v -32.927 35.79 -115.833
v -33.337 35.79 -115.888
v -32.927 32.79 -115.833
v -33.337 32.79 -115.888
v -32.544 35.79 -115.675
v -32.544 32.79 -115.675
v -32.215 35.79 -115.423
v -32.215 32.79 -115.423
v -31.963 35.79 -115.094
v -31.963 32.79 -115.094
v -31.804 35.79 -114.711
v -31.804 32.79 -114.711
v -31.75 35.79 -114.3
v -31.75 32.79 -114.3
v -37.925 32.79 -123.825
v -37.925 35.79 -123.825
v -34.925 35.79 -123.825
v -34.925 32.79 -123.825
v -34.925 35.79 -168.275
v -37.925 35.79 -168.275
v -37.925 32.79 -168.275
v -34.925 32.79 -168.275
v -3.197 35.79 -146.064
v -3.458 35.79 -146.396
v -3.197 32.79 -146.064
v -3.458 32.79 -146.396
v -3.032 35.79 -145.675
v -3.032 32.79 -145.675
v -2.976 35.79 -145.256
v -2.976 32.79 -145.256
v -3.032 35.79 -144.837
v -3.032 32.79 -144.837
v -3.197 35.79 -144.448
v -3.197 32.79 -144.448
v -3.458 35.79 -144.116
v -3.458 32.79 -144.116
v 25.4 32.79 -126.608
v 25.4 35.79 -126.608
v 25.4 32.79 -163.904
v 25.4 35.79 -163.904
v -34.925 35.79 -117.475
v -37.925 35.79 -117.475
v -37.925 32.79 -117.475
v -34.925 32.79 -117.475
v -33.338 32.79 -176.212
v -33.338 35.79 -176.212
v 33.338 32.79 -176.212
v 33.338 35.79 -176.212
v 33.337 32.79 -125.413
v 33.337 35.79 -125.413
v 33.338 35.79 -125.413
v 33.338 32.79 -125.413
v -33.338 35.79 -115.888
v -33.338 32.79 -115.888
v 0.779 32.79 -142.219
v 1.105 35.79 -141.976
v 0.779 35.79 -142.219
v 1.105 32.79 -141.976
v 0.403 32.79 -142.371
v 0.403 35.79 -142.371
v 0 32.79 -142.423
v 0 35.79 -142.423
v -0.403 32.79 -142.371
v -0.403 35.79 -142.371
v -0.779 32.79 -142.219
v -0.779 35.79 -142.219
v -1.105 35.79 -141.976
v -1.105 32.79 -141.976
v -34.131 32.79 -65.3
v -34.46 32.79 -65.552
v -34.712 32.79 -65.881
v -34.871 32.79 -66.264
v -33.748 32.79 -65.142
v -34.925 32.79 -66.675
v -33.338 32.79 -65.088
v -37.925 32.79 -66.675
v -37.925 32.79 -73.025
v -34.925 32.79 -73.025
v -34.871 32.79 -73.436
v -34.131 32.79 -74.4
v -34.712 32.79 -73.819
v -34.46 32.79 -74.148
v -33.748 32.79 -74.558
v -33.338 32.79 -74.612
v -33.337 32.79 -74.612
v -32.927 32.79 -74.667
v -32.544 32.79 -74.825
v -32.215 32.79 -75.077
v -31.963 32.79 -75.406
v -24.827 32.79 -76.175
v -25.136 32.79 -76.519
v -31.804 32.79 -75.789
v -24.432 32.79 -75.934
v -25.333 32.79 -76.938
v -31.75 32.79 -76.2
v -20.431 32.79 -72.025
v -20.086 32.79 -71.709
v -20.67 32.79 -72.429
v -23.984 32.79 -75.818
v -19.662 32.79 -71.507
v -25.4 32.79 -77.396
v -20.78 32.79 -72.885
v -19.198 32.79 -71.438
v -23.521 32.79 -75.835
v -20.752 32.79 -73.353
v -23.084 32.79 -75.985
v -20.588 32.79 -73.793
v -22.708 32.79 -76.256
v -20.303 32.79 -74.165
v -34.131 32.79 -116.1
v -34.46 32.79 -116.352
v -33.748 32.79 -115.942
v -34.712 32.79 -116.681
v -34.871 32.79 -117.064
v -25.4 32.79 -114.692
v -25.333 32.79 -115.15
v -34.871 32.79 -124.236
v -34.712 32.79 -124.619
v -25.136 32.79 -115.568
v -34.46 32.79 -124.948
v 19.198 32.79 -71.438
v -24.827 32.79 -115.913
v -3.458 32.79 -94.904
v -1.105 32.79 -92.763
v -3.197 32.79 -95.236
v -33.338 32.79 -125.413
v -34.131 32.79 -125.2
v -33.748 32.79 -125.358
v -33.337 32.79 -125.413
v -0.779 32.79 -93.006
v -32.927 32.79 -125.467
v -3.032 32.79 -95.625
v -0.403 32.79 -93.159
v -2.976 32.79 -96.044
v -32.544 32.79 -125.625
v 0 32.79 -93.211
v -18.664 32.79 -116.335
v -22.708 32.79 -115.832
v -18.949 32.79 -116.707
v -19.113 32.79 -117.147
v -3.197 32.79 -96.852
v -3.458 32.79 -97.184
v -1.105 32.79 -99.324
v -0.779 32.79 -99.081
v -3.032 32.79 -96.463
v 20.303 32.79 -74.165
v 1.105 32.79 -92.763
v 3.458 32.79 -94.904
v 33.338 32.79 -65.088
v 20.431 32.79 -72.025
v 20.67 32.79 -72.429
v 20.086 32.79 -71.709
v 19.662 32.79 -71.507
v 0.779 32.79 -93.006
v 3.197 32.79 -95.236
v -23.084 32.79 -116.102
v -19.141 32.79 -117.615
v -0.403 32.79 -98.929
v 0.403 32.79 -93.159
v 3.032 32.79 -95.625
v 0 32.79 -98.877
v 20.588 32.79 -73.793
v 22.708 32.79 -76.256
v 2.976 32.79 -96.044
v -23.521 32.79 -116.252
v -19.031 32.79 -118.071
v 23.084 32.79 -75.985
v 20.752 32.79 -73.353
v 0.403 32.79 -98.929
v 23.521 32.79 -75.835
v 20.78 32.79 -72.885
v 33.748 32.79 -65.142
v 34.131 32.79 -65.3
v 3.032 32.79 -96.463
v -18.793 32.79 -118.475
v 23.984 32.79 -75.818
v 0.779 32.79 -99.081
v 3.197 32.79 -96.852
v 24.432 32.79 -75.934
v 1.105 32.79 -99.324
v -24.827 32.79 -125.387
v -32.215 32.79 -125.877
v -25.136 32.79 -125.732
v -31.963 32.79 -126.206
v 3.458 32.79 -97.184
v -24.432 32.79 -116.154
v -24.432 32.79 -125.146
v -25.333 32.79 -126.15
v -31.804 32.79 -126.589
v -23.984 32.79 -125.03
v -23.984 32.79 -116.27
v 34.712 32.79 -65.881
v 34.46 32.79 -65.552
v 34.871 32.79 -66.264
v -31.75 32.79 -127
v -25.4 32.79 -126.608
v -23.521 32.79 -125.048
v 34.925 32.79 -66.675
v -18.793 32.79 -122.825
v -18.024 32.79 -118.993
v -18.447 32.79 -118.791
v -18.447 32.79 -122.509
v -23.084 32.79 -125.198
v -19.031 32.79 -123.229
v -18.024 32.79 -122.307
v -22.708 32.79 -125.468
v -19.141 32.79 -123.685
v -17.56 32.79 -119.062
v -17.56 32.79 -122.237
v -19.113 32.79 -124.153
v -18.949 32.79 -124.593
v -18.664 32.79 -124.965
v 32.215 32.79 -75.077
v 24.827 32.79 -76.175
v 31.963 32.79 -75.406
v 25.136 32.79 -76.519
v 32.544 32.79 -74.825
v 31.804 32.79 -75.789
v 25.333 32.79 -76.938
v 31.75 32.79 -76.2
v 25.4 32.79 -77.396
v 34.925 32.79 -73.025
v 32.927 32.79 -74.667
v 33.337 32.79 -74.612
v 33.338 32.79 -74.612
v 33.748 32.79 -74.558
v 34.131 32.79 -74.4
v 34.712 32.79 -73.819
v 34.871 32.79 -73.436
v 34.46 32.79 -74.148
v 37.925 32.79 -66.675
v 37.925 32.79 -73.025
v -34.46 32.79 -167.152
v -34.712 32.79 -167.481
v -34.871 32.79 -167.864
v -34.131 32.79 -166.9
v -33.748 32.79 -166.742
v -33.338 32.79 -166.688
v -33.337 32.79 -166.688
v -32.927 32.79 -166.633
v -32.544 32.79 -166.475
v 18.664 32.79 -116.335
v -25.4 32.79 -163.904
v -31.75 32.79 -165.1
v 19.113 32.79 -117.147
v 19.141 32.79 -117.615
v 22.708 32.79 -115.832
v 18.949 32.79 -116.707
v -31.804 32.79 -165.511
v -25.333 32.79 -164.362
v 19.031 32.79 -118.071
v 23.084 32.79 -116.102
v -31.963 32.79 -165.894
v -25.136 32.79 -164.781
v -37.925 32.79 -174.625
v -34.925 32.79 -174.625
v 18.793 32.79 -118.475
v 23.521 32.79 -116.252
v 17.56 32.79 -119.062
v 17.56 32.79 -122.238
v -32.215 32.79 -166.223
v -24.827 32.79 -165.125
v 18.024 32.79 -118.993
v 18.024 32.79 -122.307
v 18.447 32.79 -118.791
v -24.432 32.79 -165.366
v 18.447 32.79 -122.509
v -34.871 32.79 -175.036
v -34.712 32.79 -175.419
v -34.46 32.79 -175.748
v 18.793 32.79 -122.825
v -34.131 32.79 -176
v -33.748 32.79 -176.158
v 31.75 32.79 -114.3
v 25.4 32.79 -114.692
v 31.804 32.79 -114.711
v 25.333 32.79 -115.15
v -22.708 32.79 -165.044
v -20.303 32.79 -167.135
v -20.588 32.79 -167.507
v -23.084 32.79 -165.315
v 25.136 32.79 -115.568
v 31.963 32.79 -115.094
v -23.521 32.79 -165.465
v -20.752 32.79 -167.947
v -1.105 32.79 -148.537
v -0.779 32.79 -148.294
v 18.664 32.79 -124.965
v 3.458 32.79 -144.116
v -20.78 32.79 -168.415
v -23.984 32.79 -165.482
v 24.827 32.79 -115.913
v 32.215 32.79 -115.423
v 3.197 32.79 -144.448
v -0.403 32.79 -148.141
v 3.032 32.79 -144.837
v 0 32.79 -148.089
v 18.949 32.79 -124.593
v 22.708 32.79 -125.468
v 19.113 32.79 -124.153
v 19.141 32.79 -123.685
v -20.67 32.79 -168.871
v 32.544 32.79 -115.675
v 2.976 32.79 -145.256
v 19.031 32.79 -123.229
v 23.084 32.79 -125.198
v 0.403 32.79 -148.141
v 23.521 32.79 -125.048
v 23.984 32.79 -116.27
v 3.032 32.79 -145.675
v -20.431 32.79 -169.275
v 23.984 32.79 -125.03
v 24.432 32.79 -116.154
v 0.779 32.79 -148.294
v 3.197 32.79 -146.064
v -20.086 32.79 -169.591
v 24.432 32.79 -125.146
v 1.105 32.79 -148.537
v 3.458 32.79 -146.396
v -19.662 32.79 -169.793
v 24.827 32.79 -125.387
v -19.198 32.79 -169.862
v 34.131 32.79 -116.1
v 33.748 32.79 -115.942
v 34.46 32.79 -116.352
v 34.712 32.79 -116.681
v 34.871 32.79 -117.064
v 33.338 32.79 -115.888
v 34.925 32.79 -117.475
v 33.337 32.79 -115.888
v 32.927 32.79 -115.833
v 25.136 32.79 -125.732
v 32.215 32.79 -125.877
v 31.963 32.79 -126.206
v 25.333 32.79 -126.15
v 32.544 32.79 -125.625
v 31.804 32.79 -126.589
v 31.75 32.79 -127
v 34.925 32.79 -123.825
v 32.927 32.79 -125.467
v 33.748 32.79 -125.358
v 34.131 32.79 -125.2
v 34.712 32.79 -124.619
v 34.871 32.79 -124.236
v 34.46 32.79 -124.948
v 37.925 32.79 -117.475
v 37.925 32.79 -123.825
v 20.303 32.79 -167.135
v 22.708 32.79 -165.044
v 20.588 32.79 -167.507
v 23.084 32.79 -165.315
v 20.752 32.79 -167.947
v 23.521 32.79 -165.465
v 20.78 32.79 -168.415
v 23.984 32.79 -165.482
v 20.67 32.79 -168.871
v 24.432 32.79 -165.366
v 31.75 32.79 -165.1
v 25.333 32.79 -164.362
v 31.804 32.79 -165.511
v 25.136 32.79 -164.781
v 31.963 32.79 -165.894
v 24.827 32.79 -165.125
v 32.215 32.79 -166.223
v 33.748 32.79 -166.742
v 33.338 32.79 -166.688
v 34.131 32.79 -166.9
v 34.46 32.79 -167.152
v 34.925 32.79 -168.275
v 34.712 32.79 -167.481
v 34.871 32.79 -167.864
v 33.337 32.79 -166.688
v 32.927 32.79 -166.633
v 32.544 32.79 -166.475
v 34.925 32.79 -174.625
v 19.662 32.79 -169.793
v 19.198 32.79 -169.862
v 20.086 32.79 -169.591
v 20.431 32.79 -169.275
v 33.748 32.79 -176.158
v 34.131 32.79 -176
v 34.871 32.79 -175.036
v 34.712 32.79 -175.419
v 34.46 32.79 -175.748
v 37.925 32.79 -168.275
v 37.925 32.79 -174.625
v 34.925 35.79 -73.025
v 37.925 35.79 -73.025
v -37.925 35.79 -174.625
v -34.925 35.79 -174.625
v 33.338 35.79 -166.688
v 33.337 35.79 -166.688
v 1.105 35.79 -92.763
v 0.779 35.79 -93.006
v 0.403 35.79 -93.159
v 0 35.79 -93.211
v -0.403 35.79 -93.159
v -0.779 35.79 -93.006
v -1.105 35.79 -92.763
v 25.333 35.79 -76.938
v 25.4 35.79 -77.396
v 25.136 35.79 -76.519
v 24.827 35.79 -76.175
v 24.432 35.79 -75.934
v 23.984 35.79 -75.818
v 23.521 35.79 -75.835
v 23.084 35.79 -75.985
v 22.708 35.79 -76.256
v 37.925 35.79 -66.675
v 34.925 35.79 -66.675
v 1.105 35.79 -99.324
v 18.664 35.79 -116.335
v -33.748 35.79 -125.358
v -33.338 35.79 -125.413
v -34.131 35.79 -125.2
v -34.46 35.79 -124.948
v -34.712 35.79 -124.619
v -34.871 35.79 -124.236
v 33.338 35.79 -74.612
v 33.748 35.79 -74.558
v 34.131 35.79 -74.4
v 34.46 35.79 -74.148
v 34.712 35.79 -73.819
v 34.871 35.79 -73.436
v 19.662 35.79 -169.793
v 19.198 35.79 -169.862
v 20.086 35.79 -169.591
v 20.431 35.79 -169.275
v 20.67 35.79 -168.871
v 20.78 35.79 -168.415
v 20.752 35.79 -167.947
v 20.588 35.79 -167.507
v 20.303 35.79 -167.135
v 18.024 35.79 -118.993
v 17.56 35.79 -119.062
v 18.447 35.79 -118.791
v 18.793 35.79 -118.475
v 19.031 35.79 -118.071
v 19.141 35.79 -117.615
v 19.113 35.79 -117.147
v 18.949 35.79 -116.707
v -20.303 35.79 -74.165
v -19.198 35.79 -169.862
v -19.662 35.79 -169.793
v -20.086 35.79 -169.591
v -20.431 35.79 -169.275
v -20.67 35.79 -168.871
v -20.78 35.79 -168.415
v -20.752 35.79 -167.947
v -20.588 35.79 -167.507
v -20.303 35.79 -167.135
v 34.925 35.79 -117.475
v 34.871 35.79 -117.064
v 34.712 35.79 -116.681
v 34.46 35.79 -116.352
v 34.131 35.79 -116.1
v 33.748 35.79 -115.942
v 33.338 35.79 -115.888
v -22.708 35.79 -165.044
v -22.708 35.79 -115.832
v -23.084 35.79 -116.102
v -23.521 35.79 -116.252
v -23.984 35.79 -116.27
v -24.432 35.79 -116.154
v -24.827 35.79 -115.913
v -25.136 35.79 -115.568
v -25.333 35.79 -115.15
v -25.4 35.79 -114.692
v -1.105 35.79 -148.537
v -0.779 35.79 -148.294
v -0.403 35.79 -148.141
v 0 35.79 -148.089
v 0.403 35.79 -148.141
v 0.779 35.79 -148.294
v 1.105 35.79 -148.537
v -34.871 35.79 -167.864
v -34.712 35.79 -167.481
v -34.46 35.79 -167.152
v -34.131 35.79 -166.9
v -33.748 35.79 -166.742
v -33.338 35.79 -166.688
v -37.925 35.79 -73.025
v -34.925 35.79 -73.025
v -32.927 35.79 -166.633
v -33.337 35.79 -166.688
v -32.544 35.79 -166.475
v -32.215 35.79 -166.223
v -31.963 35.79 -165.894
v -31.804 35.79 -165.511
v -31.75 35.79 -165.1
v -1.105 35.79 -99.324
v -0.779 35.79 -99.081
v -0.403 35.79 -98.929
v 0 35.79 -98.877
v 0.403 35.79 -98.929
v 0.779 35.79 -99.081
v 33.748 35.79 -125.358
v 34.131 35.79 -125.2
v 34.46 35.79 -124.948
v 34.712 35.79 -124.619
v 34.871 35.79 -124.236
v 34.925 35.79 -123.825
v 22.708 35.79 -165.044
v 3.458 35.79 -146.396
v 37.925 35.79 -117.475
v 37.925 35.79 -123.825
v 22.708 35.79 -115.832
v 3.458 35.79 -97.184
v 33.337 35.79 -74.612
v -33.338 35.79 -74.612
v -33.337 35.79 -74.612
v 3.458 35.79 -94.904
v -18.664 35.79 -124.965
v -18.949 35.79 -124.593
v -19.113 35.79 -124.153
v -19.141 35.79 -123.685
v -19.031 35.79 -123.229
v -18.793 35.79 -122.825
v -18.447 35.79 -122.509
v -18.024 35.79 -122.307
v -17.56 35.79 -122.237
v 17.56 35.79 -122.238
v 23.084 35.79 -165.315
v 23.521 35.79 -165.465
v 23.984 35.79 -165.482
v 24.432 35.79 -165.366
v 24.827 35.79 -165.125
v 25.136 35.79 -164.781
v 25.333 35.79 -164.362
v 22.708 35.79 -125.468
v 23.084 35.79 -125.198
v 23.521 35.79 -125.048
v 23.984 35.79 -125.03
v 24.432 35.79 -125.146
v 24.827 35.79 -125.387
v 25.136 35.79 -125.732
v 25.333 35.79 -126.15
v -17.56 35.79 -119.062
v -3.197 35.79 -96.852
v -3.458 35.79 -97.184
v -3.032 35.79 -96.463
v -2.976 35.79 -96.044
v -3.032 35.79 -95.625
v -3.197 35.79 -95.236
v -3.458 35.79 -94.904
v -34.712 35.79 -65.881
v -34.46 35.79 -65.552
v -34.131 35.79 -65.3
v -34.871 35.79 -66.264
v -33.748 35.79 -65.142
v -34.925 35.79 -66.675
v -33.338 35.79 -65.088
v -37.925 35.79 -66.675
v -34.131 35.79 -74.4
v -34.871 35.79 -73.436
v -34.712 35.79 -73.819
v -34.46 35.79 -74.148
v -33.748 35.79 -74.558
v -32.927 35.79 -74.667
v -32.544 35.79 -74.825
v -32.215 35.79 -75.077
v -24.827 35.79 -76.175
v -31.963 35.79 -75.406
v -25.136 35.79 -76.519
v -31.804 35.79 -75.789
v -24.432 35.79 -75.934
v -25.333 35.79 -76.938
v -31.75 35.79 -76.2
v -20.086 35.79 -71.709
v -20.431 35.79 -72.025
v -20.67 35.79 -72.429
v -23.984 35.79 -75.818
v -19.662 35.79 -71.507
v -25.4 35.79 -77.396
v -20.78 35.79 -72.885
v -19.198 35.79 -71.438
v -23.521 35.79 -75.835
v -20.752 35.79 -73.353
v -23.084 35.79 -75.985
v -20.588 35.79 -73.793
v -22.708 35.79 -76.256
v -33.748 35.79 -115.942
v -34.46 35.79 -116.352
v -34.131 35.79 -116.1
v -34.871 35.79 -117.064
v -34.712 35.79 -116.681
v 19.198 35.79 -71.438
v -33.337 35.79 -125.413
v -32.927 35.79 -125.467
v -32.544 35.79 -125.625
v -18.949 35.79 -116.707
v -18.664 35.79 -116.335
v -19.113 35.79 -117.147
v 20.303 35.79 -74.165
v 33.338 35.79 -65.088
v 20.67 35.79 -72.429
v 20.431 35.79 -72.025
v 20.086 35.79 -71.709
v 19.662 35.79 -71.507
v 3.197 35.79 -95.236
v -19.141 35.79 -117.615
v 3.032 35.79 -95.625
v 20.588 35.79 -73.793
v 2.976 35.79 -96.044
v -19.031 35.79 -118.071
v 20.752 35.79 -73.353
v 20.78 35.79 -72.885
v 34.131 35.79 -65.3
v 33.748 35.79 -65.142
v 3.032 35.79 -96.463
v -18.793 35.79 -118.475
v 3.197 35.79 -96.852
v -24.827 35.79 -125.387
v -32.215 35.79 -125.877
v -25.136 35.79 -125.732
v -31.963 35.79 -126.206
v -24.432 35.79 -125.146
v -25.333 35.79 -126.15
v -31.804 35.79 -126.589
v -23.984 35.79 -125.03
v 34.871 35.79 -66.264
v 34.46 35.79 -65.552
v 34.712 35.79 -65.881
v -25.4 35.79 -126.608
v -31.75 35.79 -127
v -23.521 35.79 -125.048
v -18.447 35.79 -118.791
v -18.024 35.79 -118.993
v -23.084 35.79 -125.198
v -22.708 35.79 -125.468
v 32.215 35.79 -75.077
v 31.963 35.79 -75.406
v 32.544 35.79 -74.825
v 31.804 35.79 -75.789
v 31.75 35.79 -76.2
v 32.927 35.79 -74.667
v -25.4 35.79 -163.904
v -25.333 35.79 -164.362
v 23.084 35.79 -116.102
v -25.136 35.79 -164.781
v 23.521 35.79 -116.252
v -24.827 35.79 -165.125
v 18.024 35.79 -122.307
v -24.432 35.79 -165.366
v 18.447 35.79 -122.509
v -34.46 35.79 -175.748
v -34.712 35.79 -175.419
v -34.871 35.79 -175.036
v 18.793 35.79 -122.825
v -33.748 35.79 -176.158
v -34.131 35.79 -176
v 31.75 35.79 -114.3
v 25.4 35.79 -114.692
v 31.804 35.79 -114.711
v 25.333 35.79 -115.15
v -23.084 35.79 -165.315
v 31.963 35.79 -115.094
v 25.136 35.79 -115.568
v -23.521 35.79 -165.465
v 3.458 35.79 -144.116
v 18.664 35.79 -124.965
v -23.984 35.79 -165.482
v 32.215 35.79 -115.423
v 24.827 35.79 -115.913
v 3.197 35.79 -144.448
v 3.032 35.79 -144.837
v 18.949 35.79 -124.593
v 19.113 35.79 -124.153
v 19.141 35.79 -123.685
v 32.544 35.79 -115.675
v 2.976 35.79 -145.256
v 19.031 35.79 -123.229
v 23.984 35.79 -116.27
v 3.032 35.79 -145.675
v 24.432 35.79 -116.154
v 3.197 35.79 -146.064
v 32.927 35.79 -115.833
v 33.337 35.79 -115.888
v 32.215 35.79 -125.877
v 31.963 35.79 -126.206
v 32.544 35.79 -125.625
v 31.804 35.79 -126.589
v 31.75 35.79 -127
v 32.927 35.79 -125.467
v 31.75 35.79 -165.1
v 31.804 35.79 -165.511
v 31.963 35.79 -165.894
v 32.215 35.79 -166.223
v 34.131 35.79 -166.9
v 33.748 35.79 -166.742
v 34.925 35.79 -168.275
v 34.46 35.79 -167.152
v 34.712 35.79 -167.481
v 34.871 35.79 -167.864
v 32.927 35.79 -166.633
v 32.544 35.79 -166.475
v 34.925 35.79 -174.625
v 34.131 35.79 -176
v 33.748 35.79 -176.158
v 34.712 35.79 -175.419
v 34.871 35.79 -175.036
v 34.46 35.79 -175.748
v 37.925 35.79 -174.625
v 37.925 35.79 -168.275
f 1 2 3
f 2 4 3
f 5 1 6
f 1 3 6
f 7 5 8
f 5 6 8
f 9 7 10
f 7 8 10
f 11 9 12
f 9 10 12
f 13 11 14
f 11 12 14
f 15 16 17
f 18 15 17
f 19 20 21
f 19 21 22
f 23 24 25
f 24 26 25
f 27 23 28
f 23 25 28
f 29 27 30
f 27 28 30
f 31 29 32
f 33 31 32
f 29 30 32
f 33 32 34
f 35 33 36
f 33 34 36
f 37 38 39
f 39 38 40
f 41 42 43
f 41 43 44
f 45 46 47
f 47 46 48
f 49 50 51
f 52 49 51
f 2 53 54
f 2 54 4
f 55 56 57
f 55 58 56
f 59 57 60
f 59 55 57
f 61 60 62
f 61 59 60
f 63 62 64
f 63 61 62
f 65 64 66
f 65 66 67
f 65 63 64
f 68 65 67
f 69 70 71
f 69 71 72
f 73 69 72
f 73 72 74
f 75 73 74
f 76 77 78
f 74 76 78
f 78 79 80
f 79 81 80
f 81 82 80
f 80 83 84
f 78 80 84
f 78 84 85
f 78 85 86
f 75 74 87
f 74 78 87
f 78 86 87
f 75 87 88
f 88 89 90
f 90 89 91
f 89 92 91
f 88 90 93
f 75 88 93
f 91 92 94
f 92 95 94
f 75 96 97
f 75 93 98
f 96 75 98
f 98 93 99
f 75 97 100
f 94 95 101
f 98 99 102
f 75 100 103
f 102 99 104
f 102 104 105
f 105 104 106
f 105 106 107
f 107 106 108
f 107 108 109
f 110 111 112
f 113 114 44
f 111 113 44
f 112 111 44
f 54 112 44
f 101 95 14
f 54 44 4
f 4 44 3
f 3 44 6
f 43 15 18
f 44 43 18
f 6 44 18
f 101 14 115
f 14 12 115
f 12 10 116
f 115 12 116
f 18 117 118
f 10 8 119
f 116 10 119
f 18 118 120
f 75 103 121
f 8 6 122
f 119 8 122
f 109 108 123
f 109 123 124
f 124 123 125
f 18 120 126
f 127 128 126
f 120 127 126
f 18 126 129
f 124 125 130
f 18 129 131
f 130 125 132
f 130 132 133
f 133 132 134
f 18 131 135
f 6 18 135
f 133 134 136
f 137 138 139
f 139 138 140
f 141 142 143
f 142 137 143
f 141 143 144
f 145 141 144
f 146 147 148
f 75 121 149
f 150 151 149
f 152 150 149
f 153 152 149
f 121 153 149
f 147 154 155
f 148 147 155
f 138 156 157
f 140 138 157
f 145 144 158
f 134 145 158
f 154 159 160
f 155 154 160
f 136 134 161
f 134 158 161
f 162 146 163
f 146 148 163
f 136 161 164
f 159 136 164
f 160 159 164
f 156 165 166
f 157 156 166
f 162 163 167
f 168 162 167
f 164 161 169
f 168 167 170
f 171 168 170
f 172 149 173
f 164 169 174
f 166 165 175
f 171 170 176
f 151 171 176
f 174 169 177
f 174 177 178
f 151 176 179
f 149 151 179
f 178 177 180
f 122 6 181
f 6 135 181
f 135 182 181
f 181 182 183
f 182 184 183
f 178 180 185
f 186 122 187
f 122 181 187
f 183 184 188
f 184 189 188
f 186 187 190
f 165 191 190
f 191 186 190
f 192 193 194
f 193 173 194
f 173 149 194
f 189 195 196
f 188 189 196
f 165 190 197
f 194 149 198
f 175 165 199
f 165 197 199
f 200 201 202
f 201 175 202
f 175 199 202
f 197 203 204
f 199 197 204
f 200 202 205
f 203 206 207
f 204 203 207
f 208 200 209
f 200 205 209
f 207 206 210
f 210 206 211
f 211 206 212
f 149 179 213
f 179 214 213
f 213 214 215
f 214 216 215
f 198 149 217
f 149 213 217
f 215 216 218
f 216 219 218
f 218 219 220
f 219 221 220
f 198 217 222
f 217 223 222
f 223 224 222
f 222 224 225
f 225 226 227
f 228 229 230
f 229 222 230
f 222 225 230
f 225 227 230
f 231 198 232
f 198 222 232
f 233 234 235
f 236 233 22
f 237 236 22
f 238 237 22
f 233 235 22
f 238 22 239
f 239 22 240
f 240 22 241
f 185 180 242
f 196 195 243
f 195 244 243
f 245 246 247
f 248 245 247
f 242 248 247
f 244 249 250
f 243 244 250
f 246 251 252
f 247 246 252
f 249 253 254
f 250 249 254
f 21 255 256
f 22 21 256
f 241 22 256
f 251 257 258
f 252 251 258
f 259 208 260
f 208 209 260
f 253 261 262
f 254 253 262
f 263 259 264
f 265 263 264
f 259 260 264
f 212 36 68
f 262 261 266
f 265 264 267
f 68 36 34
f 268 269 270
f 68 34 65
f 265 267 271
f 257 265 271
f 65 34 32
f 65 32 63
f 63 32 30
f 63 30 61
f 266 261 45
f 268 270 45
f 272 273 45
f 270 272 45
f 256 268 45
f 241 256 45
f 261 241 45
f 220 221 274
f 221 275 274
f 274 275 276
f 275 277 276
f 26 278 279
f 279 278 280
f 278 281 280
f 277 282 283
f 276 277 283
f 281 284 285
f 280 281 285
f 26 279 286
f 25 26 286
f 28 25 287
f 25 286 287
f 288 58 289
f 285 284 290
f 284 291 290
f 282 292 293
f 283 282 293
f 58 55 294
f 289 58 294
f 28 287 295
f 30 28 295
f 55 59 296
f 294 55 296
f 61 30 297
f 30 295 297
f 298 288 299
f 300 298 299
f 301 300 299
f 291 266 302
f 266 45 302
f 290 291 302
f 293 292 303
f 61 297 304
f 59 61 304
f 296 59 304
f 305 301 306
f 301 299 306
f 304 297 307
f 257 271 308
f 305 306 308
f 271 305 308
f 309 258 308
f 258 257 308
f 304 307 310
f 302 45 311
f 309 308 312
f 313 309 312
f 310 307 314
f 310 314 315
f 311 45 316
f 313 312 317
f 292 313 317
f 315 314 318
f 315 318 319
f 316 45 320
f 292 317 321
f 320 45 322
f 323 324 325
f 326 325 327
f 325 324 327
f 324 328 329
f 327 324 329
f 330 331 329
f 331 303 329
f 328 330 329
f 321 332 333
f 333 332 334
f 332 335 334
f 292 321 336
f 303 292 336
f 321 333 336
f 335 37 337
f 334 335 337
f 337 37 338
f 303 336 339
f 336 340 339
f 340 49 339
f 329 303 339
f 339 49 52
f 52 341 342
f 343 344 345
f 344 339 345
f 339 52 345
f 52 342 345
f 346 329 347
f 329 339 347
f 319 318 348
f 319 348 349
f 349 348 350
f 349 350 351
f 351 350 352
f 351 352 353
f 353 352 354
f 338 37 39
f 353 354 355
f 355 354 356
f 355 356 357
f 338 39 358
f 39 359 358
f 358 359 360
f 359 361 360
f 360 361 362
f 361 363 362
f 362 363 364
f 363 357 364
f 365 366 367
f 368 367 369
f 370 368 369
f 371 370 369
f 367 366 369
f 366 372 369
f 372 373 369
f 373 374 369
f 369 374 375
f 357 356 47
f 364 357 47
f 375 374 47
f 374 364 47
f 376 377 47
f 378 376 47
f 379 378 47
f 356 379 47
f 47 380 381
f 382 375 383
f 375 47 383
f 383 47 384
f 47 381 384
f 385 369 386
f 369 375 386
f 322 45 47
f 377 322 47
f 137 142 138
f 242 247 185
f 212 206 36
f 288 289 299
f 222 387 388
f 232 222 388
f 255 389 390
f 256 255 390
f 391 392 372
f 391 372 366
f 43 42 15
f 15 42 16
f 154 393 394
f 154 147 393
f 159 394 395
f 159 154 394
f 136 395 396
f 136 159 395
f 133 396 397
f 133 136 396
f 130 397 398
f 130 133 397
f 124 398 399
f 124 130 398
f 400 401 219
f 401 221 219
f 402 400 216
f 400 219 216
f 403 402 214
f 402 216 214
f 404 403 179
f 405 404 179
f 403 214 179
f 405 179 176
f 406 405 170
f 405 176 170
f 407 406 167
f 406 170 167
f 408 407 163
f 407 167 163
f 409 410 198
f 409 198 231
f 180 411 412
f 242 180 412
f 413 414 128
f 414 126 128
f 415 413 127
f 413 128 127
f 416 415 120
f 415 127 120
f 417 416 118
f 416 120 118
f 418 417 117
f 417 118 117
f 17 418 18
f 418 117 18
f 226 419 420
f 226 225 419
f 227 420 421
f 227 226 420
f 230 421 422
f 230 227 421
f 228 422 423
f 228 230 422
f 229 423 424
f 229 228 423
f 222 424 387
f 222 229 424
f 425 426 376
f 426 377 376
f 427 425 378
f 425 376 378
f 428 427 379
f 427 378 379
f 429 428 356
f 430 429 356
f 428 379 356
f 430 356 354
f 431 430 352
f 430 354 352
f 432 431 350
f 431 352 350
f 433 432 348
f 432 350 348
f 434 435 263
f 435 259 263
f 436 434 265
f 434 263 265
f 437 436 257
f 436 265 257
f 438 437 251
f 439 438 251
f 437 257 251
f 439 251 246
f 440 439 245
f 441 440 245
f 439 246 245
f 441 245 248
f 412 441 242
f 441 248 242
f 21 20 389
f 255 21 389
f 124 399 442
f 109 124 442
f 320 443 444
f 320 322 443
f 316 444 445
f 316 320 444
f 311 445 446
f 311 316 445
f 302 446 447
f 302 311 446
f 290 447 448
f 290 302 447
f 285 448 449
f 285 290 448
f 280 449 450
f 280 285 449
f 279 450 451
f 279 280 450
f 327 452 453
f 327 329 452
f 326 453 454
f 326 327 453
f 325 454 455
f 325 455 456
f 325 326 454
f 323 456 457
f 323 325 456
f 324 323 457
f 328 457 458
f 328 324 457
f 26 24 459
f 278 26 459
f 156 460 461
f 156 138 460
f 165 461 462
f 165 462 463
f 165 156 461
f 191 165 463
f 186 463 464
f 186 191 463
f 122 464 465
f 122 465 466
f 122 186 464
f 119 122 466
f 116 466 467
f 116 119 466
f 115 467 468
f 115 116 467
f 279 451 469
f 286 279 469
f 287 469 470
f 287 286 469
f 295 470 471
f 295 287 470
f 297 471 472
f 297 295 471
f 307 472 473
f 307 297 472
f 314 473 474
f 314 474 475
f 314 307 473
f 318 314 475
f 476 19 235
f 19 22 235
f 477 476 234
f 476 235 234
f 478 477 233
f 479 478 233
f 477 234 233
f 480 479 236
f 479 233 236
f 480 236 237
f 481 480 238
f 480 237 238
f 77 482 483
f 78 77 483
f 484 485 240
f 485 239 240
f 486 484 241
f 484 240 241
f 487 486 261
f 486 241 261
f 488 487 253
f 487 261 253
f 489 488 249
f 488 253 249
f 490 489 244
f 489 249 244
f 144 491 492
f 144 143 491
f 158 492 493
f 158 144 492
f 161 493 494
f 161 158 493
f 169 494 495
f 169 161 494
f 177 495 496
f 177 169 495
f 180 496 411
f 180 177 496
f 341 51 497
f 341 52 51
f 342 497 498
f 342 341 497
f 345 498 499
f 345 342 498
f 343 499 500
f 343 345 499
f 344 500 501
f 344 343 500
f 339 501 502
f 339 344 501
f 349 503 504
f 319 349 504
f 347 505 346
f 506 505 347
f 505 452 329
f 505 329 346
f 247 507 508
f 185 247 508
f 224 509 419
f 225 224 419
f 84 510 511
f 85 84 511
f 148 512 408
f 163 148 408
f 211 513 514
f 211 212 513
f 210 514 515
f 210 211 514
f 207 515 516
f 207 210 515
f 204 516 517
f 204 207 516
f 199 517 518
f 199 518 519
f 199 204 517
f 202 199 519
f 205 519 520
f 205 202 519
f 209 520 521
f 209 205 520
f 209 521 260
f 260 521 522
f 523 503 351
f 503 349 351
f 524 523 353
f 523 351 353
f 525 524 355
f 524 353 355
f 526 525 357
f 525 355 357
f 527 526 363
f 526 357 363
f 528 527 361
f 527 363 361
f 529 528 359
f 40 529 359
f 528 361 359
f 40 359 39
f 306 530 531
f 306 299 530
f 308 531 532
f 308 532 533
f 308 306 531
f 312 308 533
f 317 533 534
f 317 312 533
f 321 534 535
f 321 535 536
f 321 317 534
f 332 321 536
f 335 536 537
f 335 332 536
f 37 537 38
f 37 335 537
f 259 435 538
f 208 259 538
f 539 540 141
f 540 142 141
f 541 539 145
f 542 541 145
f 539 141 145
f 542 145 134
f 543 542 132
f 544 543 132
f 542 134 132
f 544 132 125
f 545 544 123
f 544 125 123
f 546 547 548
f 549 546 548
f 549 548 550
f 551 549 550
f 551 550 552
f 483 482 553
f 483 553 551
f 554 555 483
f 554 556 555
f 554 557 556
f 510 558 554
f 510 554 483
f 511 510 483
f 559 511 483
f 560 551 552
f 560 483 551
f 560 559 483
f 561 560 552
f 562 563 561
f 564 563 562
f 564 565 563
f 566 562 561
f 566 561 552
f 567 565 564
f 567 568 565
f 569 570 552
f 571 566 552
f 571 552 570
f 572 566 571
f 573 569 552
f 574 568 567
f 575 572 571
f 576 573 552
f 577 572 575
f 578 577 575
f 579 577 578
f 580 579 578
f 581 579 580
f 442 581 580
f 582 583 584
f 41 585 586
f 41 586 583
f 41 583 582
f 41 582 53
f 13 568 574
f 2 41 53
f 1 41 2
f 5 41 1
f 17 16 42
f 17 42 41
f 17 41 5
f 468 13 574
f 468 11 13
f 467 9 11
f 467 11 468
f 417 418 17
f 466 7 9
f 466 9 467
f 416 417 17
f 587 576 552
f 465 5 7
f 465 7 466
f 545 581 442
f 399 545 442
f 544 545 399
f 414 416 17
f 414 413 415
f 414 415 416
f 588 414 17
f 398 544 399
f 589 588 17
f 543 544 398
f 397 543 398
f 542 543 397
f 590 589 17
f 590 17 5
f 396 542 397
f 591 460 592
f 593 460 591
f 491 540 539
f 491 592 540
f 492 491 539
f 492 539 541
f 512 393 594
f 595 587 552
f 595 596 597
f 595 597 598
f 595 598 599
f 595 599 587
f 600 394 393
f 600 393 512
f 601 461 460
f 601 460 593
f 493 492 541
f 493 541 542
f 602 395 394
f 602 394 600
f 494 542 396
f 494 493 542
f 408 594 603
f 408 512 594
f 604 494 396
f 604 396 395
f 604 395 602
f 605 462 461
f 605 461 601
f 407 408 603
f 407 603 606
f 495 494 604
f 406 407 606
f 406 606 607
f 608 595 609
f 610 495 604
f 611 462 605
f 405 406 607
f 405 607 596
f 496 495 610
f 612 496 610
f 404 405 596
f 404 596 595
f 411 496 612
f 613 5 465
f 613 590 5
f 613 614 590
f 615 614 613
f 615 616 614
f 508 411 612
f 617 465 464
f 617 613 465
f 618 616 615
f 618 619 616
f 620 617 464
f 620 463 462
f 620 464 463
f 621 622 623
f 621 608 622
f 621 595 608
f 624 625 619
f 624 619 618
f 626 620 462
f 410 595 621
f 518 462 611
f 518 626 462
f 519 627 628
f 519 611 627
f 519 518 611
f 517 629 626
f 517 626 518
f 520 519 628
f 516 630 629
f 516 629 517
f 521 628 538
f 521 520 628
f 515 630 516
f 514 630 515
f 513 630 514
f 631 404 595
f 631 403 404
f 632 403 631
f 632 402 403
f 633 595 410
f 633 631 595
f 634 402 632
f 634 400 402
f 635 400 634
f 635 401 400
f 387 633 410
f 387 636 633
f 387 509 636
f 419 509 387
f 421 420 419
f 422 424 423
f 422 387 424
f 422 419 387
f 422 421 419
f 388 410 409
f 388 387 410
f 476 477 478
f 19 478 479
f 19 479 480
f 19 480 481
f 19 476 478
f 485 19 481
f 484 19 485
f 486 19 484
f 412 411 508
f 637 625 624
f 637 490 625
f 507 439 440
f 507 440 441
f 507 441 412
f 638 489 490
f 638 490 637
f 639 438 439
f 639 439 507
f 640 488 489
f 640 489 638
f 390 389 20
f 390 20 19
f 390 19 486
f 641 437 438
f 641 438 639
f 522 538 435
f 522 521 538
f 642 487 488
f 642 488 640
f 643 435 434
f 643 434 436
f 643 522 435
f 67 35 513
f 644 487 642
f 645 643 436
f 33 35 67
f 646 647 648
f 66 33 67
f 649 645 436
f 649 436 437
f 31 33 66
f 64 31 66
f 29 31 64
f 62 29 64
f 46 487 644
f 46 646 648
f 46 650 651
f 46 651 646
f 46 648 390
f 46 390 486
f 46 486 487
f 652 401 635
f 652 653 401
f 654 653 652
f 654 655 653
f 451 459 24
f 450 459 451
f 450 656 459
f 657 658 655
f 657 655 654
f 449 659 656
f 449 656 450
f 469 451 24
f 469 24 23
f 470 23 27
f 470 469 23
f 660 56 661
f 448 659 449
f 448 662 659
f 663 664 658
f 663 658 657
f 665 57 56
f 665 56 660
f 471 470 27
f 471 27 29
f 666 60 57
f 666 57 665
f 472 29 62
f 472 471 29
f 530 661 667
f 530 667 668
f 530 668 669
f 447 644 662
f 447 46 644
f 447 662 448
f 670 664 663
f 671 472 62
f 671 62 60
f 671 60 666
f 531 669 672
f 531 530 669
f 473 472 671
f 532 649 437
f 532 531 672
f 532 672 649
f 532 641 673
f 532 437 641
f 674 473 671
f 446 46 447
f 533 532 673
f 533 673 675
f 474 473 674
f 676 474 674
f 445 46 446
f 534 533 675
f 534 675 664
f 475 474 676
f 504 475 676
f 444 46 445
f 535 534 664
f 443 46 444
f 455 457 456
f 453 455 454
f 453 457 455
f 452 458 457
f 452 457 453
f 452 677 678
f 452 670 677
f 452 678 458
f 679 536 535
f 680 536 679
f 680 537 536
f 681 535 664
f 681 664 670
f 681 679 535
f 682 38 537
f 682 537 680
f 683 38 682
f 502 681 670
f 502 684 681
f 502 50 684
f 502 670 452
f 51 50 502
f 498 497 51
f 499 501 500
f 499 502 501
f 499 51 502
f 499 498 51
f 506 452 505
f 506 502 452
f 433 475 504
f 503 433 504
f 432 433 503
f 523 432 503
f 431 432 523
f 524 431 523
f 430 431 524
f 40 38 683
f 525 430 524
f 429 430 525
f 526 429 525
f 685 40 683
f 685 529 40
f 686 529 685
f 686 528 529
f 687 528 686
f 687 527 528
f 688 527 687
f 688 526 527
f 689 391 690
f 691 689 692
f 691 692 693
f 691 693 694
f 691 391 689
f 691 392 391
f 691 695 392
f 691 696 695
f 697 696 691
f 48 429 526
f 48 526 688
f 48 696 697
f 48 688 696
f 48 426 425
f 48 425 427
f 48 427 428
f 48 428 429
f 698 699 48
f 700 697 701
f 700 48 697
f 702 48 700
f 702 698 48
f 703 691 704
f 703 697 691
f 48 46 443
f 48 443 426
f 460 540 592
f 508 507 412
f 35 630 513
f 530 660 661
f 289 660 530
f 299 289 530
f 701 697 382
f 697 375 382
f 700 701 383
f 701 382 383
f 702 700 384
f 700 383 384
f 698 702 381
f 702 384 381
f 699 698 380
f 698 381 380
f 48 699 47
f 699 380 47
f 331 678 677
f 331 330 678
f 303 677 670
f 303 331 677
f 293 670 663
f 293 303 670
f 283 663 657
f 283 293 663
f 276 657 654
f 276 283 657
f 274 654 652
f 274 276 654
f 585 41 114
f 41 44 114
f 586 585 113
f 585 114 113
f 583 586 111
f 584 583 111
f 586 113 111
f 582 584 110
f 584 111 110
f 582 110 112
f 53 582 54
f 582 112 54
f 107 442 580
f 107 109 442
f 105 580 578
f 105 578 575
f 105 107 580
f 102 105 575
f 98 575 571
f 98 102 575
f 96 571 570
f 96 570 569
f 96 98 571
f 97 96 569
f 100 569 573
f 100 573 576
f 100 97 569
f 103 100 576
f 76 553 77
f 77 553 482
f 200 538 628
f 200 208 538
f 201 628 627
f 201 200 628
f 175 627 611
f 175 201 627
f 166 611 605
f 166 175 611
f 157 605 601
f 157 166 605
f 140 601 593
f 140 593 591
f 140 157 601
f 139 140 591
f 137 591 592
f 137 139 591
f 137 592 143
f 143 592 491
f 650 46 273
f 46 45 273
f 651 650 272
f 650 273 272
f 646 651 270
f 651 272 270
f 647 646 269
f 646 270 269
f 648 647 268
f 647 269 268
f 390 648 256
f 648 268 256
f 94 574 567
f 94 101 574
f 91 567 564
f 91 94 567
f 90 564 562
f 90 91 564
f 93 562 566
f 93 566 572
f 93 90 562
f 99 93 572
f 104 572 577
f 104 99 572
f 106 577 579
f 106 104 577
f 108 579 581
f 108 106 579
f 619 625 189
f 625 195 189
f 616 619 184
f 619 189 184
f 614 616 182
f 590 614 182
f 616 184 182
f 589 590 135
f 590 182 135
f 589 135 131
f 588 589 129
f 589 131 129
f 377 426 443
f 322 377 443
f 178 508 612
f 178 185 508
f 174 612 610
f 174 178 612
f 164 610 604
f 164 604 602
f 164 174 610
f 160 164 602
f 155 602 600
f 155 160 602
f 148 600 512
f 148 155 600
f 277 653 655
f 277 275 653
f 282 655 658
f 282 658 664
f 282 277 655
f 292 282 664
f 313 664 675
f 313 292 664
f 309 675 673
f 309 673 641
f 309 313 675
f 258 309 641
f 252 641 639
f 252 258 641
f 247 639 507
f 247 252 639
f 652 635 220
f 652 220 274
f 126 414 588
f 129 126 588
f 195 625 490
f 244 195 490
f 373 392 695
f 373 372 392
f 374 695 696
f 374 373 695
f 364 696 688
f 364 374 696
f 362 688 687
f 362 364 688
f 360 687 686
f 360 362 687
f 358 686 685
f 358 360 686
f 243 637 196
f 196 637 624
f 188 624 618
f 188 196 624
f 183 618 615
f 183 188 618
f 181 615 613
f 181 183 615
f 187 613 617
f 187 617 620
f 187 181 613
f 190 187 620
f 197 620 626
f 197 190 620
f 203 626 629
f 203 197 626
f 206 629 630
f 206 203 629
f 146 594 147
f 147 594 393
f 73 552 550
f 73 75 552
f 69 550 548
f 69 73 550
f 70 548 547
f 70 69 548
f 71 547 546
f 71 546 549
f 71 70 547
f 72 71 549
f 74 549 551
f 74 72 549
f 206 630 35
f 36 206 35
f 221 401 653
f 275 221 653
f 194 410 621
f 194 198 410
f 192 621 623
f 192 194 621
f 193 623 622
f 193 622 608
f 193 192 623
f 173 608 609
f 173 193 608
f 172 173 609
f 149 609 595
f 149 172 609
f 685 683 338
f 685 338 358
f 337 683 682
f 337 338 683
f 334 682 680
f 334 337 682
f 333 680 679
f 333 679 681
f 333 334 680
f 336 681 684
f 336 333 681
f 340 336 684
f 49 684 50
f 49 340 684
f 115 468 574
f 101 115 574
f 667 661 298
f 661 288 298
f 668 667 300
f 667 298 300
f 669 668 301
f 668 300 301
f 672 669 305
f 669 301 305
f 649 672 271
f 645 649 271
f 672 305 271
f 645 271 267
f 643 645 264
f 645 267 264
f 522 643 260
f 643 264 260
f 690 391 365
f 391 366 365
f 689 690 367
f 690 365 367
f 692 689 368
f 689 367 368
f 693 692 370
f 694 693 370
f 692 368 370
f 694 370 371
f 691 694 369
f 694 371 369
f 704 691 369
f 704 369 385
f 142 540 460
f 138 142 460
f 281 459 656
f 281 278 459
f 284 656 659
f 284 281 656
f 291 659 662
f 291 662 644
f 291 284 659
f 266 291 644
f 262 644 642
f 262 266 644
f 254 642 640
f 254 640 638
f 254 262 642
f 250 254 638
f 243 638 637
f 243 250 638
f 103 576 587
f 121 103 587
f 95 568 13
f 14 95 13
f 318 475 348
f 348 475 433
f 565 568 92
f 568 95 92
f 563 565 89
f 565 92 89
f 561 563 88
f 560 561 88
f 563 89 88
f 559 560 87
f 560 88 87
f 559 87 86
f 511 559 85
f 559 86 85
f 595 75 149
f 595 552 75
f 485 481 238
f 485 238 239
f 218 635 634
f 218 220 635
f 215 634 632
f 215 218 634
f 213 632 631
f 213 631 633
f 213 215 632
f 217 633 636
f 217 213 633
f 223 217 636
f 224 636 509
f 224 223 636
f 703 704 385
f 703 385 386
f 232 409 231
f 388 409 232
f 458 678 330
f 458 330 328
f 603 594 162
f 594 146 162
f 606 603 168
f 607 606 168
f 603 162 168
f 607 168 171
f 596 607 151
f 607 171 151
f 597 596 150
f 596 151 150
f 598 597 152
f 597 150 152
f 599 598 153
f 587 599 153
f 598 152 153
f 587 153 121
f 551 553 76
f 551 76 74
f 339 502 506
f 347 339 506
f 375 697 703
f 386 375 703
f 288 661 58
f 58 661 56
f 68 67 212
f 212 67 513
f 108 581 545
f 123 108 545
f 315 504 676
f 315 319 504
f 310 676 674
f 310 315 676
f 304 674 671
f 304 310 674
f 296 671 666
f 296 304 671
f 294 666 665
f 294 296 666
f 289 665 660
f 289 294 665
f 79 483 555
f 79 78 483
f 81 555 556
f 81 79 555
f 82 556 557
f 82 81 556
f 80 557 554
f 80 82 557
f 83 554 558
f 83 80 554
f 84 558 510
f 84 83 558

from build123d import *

# Parameters (mm, degrees)
SKETCH1_W           = 63.5
SKETCH1_H           = 111.125
BOSS_EXTRUDE1_DEPTH = 1.5
SKETCH2_W           = 3.175
SKETCH2_H           = 9.525
BOSS_EXTRUDE2_DEPTH = 3
CUT_EXTRUDE1_DEPTH  = 3
FILLET1_R           = 1.5875
SKETCH5_W           = 3
SKETCH5_H           = 6.35
BOSS_EXTRUDE3_DEPTH = 3


with BuildPart() as part:
    # Sketch1 → Boss-Extrude1 (new, symmetric)
    with BuildSketch(Plane(origin=(0, 34.29, 0), x_dir=(1, 0, 0), z_dir=(0, 1, 0))):
        with Locations((0, 120.65)):
            Rectangle(SKETCH1_W, SKETCH1_H)
    extrude(amount=BOSS_EXTRUDE1_DEPTH, both=True)

    # Sketch2 → Boss-Extrude2 (add)
    with BuildSketch(Plane(origin=(0, 35.79, 0), x_dir=(1, 0, 0), z_dir=(0, 1, 0))):
        with Locations((33.3375, 171.45)):
            Rectangle(SKETCH2_W, SKETCH2_H)
        with Locations((-33.3375, 171.45)):
            Rectangle(SKETCH2_W, SKETCH2_H)
        with Locations((33.3375, 120.65)):
            Rectangle(SKETCH2_W, SKETCH2_H)
        with Locations((-33.3375, 120.65)):
            Rectangle(SKETCH2_W, SKETCH2_H)
        with Locations((33.3375, 69.85)):
            Rectangle(SKETCH2_W, SKETCH2_H)
        with Locations((-33.3375, 69.85)):
            Rectangle(SKETCH2_W, SKETCH2_H)
    extrude(amount=-BOSS_EXTRUDE2_DEPTH)

    # Sketch4 → Cut-Extrude1 (cut)
    with BuildSketch(Plane(origin=(0, 35.79, 0), x_dir=(1, 0, 0), z_dir=(0, 1, 0))):
        Polygon((23.118437891, 169.8625), (-23.118437891, 169.8625), (0, 147.466513293), align=None)
        Polygon((-2.281562109, 145.25625), (-25.4, 167.652236707), (-25.4, 122.860263293), align=None)
        Polygon((25.4, 167.652236707), (2.281562109, 145.25625), (25.4, 122.860263293), align=None)
        Polygon((21.479728214, 122.2375), (0, 143.045986707), (-21.479728214, 122.2375), align=None)
        Polygon((-2.281562109, 96.04375), (-25.4, 118.439736707), (-25.4, 73.647763293), align=None)
        Polygon((21.479728214, 119.0625), (-21.479728214, 119.0625), (0, 98.254013293), align=None)
        Polygon((25.4, 73.647763293), (25.4, 118.439736707), (2.281562109, 96.04375), align=None)
        Polygon((23.118437891, 71.4375), (0, 93.833486707), (-23.118437891, 71.4375), align=None)
    extrude(amount=-CUT_EXTRUDE1_DEPTH, mode=Mode.SUBTRACT)

    # Fillet1
    fillet1_edges = [part.edges().sort_by_distance(p)[0] for p in [
        (-21.479728214, 34.29, -119.0625),
        (21.479728214, 34.29, -119.0625),
        (0, 34.29, -98.254013293),
        (-25.4, 34.29, -118.439736707),
        (-2.281562109, 34.29, -96.04375),
        (-25.4, 34.29, -73.647763293),
        (25.4, 34.29, -167.652236707),
        (25.4, 34.29, -122.860263293),
        (2.281562109, 34.29, -145.25625),
        (23.118437891, 34.29, -169.8625),
        (0, 34.29, -147.466513293),
        (-23.118437891, 34.29, -169.8625),
        (2.281562109, 34.29, -96.04375),
        (25.4, 34.29, -118.439736707),
        (25.4, 34.29, -73.647763293),
        (34.925, 34.29, -65.0875),
        (34.925, 34.29, -74.6125),
        (31.75, 34.29, -74.6125),
        (31.75, 34.29, -115.8875),
        (34.925, 34.29, -115.8875),
        (34.925, 34.29, -125.4125),
        (31.75, 34.29, -125.4125),
        (31.75, 34.29, -166.6875),
        (34.925, 34.29, -166.6875),
        (34.925, 34.29, -176.2125),
        (-34.925, 34.29, -166.6875),
        (-31.75, 34.29, -166.6875),
        (-31.75, 34.29, -125.4125),
        (-34.925, 34.29, -125.4125),
        (-34.925, 34.29, -115.8875),
        (-31.75, 34.29, -115.8875),
        (-31.75, 34.29, -74.6125),
        (-34.925, 34.29, -74.6125),
        (-34.925, 34.29, -65.0875),
        (-25.4, 34.29, -122.860263293),
        (-25.4, 34.29, -167.652236707),
        (-2.281562109, 34.29, -145.25625),
        (-23.118437891, 34.29, -71.4375),
        (0, 34.29, -93.833486707),
        (23.118437891, 34.29, -71.4375),
        (-21.479728214, 34.29, -122.2375),
        (0, 34.29, -143.045986707),
        (21.479728214, 34.29, -122.2375),
        (-34.925, 34.29, -176.2125),
    ]]
    fillet(fillet1_edges, radius=FILLET1_R - 0.0001)  # a hair under: the kernel refuses the full size

    # Sketch5 → Boss-Extrude3 (add)
    with BuildSketch(Plane(origin=(0, 35.79, 0), x_dir=(1, 0, 0), z_dir=(0, 1, 0))):
        with Locations((36.425, 171.45)):
            Rectangle(SKETCH5_W, SKETCH5_H)
        with Locations((-36.425, 171.45)):
            Rectangle(SKETCH5_W, SKETCH5_H)
        with Locations((36.425, 120.65)):
            Rectangle(SKETCH5_W, SKETCH5_H)
        with Locations((-36.425, 120.65)):
            Rectangle(SKETCH5_W, SKETCH5_H)
        with Locations((36.425, 69.85)):
            Rectangle(SKETCH5_W, SKETCH5_H)
        with Locations((-36.425, 69.85)):
            Rectangle(SKETCH5_W, SKETCH5_H)
    extrude(amount=-BOSS_EXTRUDE3_DEPTH)


solid = part.part
